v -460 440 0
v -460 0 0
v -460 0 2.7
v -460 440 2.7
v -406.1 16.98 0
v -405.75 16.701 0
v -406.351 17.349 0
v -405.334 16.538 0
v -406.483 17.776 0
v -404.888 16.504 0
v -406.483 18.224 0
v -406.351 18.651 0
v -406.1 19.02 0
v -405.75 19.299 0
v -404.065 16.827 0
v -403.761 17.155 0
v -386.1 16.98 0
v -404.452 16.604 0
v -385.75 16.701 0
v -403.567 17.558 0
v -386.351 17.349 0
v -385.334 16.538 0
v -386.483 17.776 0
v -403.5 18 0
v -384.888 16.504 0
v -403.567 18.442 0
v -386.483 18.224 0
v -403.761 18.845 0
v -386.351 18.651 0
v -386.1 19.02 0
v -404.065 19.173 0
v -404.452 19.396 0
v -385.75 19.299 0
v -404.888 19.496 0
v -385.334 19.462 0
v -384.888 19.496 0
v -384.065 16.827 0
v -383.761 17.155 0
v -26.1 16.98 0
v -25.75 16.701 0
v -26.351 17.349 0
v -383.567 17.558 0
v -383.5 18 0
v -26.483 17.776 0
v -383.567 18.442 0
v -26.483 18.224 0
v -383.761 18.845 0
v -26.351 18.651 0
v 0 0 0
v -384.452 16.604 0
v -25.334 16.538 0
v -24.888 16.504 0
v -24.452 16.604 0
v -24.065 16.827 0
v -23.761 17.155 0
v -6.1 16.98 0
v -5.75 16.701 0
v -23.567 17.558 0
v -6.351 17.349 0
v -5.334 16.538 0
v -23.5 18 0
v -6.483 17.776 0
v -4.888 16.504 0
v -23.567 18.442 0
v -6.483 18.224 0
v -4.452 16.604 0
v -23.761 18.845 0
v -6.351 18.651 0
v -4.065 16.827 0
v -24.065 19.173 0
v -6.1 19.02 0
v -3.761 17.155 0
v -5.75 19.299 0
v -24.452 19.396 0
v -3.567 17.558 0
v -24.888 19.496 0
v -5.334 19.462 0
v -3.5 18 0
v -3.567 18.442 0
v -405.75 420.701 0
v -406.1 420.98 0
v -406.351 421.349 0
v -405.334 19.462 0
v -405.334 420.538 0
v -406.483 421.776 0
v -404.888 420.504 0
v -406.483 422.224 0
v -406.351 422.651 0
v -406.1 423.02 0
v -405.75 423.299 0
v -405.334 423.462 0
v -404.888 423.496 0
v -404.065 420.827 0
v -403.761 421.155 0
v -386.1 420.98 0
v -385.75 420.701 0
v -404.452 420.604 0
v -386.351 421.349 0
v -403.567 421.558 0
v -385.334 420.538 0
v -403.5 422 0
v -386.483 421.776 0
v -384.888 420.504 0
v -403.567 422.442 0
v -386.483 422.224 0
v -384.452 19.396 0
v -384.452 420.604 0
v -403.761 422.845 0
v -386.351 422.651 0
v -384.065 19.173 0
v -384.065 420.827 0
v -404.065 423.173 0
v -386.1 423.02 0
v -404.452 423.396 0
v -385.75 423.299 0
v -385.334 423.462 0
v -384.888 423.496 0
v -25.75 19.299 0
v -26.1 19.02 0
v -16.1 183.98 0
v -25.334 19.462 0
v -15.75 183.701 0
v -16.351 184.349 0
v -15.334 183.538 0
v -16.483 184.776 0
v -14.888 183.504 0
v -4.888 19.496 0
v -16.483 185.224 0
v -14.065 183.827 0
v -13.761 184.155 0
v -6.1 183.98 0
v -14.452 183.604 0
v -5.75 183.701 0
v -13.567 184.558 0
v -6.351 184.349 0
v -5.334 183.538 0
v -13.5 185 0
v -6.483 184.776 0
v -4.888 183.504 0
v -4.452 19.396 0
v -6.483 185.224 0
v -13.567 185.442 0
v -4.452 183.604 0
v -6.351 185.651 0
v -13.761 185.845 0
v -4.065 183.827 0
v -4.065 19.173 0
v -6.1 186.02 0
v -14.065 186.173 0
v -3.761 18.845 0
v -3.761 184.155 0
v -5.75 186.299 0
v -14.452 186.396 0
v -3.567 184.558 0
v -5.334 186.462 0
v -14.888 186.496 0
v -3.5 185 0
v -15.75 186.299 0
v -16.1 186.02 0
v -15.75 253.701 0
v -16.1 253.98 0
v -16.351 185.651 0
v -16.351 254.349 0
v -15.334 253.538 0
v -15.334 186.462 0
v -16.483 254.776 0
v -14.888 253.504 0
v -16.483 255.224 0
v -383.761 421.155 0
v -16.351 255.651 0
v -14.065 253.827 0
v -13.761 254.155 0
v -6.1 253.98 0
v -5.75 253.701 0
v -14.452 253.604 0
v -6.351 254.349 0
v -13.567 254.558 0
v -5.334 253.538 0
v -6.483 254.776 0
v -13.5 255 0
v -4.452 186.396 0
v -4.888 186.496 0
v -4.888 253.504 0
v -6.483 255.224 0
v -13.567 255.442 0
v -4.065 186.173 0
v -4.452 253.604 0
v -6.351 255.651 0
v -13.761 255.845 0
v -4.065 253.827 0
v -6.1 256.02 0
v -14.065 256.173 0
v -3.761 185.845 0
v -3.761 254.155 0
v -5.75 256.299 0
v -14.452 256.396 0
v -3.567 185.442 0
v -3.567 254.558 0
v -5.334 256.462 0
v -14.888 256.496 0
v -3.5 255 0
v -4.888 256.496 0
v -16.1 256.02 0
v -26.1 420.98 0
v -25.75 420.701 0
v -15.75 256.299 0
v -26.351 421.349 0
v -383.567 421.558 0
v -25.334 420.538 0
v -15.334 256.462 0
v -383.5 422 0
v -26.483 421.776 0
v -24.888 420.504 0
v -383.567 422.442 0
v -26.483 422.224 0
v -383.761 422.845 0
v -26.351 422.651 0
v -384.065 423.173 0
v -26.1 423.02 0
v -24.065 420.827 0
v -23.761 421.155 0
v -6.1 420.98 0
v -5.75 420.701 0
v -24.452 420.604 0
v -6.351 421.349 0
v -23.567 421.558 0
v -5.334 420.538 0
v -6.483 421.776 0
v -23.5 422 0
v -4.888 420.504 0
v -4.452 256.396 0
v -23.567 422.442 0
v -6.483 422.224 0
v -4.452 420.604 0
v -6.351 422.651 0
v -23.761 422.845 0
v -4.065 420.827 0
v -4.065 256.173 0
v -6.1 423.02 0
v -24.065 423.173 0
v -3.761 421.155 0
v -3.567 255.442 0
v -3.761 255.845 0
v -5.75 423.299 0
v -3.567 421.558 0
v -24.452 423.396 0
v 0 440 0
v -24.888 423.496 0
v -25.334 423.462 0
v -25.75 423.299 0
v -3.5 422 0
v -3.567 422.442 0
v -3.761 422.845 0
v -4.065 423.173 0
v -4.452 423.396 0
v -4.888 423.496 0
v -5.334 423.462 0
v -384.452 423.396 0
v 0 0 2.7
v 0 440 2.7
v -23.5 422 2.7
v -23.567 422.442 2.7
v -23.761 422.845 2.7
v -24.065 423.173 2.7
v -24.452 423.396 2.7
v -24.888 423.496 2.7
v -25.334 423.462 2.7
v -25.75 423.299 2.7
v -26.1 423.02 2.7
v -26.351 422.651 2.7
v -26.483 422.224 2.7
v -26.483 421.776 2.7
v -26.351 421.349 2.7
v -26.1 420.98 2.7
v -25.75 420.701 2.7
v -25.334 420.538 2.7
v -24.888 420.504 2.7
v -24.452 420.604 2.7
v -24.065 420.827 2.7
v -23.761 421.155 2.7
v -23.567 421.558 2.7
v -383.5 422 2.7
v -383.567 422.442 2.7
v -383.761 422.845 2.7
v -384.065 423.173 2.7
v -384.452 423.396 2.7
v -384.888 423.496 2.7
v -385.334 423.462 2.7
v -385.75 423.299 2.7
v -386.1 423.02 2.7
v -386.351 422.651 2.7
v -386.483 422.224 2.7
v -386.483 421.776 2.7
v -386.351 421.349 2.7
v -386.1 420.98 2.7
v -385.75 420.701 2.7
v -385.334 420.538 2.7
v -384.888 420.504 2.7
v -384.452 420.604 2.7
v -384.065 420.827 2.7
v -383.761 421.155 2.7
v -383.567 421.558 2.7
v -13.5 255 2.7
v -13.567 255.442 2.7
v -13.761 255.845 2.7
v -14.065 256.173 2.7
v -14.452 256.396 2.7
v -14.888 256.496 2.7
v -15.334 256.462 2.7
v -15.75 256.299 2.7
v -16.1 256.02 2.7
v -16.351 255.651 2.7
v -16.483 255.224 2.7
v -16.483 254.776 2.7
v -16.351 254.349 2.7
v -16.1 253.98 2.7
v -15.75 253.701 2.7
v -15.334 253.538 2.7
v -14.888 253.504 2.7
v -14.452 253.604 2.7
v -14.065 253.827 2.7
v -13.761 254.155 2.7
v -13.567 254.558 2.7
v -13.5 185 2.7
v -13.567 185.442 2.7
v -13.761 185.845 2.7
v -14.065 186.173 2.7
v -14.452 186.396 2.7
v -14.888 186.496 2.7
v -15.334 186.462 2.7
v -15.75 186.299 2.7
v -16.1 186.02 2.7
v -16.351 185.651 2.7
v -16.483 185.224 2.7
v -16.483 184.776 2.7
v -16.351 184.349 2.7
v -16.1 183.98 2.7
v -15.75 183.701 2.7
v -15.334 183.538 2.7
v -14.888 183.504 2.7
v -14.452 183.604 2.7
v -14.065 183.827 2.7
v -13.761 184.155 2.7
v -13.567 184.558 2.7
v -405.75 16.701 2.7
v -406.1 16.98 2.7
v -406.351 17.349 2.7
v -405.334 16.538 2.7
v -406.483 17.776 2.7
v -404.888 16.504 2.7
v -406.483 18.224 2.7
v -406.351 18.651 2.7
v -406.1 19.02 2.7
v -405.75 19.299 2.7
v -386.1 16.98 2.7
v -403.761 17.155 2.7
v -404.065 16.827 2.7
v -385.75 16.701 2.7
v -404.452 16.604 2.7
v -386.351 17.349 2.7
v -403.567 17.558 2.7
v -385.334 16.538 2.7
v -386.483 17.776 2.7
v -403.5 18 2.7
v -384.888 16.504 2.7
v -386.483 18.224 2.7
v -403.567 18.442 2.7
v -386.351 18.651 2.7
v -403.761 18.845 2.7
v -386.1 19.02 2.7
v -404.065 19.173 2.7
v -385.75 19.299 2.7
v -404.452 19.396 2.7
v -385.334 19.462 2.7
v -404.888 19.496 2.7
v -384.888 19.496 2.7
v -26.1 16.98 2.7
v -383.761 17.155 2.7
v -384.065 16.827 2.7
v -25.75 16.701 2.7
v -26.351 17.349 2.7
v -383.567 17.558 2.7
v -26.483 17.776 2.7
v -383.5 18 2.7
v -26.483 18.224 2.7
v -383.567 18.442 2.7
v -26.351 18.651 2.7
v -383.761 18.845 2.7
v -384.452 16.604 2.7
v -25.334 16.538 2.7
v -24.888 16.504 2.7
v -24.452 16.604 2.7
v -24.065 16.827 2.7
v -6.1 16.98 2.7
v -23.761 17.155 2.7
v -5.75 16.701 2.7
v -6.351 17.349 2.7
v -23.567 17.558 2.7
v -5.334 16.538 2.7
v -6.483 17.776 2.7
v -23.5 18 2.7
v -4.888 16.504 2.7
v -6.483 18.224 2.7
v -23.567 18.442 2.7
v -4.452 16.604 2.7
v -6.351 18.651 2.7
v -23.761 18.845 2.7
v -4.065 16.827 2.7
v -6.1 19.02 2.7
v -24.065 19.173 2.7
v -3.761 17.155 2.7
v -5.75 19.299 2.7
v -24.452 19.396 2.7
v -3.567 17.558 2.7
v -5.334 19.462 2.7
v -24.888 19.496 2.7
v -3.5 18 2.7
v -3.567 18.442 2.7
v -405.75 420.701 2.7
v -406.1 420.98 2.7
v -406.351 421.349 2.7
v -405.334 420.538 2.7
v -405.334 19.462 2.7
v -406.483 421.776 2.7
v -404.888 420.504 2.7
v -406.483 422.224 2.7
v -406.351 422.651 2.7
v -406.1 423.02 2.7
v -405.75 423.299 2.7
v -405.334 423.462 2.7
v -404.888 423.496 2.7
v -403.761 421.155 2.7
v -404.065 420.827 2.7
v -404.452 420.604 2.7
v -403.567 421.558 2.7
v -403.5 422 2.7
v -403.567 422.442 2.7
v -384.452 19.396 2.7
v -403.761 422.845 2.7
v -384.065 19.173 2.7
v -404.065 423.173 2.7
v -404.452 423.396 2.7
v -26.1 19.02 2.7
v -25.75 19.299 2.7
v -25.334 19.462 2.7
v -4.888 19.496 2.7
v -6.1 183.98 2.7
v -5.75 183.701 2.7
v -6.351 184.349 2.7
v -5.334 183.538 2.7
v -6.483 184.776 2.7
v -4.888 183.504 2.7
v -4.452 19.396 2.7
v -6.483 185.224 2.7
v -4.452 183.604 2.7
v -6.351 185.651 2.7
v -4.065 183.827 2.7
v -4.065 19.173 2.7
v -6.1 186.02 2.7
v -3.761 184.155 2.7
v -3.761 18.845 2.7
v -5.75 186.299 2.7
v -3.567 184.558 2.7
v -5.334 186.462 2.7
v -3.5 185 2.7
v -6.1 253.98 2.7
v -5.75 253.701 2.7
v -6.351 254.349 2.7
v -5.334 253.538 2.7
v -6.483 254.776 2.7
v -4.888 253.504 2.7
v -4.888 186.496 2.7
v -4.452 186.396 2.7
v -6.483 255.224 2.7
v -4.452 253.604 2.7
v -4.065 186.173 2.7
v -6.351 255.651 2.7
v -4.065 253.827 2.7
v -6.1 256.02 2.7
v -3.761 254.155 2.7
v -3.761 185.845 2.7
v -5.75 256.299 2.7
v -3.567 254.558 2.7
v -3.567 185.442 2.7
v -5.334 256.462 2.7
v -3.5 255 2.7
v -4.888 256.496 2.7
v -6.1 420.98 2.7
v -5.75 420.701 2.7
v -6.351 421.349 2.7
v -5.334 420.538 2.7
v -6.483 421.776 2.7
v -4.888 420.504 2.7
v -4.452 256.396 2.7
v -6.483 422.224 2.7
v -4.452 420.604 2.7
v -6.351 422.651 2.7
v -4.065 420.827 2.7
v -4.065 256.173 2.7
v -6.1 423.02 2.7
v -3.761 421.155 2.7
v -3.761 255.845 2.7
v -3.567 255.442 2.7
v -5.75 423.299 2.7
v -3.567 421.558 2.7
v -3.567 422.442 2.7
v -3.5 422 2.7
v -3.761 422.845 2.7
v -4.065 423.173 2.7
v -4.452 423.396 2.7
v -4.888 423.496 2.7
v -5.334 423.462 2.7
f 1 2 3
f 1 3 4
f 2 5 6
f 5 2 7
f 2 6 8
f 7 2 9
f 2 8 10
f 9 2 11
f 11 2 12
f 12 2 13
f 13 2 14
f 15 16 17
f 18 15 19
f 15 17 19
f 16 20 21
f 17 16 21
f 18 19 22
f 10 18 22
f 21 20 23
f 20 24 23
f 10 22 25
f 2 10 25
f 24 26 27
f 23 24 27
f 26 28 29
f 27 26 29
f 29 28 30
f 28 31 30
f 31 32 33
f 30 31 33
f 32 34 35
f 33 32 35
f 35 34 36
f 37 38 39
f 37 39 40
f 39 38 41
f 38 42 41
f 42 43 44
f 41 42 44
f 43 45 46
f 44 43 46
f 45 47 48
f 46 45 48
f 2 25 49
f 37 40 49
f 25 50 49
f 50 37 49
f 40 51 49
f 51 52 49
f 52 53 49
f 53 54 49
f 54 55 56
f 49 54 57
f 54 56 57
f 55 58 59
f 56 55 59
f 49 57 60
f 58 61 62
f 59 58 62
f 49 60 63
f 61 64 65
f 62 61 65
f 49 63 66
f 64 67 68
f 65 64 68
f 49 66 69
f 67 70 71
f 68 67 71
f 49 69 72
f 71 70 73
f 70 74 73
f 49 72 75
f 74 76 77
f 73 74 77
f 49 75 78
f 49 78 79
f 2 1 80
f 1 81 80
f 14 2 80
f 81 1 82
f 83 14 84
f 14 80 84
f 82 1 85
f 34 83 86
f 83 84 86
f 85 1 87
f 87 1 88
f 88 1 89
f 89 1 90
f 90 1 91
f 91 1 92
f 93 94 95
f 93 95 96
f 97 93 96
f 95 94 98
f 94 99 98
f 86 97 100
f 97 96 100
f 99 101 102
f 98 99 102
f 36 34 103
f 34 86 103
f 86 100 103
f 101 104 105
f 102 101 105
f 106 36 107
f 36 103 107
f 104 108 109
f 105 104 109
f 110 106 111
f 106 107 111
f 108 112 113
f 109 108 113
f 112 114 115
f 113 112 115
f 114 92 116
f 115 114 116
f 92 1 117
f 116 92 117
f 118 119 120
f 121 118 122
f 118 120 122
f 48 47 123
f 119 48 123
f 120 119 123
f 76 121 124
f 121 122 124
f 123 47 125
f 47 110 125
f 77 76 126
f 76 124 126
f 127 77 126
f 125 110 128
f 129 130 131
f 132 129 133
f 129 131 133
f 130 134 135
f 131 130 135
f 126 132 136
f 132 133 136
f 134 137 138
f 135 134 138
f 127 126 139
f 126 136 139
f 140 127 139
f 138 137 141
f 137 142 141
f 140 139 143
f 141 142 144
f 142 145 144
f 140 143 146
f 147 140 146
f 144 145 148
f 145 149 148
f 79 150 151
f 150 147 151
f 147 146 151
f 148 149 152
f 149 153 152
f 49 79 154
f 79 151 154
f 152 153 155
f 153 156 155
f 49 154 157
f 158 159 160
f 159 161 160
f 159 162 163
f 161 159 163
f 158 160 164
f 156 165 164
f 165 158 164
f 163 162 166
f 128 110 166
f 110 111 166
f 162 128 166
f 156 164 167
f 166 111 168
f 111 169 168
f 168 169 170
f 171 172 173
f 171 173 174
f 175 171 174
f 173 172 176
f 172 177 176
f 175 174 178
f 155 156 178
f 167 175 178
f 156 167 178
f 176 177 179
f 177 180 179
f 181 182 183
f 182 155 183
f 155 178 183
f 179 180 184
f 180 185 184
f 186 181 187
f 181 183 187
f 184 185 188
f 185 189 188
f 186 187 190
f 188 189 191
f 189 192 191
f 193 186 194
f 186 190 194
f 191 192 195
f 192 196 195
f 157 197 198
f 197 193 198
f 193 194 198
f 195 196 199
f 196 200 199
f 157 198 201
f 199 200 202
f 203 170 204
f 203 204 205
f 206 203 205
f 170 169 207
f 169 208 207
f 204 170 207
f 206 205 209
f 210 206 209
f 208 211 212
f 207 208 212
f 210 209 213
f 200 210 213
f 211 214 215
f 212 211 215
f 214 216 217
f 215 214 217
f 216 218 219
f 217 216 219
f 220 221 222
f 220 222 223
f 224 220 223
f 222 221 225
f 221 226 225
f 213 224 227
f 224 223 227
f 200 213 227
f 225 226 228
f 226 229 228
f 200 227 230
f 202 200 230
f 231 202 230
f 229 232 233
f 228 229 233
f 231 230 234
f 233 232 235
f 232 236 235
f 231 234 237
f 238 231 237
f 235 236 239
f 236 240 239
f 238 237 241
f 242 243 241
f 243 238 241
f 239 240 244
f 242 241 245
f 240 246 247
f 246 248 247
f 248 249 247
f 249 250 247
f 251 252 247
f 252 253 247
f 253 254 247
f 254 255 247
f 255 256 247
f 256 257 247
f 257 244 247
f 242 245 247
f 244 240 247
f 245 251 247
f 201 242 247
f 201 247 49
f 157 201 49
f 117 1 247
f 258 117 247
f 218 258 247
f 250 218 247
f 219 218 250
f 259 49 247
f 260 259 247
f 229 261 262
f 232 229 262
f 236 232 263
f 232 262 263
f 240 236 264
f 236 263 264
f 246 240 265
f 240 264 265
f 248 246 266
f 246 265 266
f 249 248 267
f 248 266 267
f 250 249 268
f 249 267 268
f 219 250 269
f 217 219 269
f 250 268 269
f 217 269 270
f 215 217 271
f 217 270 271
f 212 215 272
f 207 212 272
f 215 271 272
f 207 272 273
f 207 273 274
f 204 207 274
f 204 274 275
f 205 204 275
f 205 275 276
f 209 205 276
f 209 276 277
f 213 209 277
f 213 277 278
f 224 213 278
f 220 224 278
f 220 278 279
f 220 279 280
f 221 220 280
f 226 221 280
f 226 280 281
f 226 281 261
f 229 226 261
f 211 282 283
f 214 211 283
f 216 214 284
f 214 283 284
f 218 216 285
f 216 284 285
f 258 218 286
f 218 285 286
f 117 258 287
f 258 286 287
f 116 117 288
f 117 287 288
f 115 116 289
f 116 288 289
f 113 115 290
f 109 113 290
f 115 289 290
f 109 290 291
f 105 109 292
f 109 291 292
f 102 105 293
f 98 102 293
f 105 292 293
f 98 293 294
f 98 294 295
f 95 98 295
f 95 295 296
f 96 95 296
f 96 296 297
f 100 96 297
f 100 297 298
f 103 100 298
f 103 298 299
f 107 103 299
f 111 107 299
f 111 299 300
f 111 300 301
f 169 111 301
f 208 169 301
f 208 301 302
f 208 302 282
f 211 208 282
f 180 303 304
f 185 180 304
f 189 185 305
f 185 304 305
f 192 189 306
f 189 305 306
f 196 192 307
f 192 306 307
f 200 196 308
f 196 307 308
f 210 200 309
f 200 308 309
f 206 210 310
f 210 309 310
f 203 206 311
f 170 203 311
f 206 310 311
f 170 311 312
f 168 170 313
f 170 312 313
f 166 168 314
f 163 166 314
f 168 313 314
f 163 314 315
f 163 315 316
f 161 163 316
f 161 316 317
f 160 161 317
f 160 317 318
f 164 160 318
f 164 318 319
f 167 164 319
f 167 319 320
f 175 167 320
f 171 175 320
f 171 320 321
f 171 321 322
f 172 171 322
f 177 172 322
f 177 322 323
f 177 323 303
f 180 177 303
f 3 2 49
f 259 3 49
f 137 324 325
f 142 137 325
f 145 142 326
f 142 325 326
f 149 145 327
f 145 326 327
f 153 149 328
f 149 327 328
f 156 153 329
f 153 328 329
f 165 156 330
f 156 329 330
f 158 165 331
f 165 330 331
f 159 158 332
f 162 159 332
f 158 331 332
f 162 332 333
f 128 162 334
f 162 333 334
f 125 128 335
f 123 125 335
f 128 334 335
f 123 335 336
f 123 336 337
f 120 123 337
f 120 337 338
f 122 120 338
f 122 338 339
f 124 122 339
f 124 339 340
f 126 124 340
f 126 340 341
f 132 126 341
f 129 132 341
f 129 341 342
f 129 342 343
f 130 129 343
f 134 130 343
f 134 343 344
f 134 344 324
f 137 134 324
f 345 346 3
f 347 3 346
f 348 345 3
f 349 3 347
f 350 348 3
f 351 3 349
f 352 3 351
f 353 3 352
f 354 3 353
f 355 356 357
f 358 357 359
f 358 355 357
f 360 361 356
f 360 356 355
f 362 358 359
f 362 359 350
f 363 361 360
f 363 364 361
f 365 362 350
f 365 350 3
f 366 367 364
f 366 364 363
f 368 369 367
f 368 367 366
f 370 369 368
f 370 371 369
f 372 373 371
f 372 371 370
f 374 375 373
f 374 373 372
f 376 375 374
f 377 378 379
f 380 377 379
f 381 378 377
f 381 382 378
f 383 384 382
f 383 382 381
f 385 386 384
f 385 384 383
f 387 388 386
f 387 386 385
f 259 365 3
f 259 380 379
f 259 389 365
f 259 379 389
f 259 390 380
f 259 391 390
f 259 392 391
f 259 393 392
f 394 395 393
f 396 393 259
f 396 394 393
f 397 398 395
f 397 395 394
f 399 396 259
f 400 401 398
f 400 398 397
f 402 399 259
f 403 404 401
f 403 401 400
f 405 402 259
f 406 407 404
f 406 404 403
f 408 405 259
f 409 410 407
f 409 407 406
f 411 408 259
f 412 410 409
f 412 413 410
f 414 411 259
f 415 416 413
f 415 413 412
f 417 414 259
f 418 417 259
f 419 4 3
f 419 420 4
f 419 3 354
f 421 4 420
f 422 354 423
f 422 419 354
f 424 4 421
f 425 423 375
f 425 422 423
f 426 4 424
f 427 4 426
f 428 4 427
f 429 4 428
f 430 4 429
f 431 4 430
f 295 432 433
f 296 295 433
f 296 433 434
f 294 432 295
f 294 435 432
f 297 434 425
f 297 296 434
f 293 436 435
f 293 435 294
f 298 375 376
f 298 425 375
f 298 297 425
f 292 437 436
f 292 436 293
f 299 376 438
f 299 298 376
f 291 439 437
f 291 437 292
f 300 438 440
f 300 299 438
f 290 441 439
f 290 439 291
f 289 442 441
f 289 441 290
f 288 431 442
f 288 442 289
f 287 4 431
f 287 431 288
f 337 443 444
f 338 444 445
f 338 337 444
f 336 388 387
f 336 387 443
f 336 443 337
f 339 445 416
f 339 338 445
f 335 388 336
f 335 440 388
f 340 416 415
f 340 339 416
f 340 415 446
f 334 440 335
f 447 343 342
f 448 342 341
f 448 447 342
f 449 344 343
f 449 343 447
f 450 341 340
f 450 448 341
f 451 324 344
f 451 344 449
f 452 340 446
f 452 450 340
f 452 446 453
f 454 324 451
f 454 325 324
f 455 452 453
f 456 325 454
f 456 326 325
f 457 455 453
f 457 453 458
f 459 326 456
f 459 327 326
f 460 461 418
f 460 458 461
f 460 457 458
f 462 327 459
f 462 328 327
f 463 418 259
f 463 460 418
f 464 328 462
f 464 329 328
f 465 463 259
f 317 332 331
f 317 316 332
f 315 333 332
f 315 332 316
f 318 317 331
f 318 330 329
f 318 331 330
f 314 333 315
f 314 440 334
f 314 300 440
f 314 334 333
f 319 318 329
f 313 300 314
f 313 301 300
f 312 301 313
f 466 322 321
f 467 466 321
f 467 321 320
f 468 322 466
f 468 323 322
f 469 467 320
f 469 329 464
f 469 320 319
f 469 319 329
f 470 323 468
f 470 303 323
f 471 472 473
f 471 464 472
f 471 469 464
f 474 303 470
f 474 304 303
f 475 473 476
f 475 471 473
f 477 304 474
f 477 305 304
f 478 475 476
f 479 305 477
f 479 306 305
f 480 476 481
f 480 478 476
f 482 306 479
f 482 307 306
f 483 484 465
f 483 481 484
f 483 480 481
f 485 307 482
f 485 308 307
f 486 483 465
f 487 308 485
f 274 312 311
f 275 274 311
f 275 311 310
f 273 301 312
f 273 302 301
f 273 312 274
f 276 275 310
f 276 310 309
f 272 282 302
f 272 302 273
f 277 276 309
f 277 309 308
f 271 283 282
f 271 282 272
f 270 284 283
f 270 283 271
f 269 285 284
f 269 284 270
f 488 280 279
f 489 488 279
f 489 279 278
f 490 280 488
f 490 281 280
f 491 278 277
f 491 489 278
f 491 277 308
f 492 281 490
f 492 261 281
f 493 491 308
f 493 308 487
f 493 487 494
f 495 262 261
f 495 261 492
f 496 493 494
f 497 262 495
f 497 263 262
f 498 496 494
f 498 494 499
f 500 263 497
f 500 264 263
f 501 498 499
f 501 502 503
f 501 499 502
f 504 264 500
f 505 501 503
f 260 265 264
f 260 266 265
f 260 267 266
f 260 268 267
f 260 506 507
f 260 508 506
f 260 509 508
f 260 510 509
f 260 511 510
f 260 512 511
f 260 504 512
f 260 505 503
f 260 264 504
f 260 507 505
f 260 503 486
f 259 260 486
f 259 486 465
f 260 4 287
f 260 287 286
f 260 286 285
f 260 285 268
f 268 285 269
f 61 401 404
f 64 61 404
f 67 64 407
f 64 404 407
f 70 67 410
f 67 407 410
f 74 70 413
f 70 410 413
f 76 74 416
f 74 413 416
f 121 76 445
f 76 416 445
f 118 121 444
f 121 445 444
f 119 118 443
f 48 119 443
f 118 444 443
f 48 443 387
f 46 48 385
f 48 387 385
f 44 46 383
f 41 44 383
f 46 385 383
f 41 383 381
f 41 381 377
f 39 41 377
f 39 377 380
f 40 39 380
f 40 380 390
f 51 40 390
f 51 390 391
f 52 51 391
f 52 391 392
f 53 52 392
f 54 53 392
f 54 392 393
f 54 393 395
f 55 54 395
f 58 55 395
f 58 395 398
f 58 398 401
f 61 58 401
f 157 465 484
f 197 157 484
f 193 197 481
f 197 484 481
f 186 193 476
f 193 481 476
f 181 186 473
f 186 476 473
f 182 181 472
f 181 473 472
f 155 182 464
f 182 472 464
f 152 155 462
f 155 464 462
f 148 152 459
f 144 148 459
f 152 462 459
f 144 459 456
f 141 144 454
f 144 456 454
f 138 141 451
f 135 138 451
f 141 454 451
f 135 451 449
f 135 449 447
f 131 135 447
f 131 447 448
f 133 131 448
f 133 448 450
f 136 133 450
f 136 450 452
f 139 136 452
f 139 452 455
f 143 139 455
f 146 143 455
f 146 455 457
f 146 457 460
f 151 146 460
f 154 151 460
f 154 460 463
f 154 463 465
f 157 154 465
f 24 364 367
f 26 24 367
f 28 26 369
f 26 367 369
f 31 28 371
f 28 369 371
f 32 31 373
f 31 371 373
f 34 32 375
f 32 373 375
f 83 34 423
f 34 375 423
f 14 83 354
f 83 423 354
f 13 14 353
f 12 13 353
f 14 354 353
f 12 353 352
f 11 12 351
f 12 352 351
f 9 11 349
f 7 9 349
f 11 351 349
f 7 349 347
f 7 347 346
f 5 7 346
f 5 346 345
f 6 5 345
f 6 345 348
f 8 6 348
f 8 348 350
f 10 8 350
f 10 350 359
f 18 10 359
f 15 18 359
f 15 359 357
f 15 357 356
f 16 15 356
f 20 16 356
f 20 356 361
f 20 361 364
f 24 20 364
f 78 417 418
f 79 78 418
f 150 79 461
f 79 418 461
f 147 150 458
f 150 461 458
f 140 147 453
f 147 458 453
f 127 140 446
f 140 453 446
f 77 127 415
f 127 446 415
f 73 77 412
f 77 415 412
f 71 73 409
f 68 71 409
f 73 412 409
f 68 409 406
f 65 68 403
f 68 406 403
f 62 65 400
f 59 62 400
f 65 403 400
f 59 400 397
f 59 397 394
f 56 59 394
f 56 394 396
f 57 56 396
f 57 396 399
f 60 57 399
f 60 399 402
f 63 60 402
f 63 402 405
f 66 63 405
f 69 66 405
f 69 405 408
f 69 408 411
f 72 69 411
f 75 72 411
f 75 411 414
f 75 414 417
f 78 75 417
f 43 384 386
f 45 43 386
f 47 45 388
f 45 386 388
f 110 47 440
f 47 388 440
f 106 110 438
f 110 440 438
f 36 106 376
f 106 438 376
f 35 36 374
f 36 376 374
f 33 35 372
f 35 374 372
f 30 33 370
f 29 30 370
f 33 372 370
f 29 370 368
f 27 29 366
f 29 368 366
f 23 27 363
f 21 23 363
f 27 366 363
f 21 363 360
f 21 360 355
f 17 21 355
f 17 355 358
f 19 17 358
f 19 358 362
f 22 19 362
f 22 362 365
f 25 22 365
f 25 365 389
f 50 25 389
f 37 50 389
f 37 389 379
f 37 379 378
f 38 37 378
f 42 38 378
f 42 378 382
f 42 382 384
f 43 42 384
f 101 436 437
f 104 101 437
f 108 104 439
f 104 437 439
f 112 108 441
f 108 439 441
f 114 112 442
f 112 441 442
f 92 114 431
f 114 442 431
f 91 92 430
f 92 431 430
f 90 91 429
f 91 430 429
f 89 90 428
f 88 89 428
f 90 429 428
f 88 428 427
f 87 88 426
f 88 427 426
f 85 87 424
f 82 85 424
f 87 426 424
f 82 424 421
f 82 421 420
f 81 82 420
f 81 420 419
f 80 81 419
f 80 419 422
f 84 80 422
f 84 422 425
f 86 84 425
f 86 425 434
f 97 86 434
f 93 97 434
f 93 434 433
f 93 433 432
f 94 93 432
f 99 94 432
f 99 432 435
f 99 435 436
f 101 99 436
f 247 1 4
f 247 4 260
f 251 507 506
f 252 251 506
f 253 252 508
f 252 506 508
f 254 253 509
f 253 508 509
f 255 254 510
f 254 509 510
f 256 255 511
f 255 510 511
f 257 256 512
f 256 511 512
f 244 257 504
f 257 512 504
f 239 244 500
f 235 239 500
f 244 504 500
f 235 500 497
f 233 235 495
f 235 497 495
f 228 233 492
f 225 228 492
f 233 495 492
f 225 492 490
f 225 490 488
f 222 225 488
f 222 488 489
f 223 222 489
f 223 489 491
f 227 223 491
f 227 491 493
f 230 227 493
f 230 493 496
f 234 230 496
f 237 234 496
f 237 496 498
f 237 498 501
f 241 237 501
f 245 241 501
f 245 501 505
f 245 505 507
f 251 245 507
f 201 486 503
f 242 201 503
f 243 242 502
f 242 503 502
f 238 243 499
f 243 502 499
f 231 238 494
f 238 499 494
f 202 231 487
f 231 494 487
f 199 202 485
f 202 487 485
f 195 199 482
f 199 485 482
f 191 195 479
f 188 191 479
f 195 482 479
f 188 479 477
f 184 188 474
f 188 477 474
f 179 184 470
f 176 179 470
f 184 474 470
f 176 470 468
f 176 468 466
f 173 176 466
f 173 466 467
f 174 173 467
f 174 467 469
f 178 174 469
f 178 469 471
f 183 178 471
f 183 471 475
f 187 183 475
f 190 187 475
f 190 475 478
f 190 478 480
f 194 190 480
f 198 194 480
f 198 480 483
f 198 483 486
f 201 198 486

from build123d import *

# Parameters (mm, degrees)
SKETCH_1_W          = 460
SKETCH_1_H          = 440
EXTRUDE_1_DEPTH     = 2.7
SKETCH_2_R          = 1.5
CUT_EXTRUDE_1_DEPTH = 10
SKETCH_3_R          = 1.5
CUT_EXTRUDE_2_DEPTH = 10


with BuildPart() as part:
    # 草图1 → 凸台-拉伸1 (new body)
    with BuildSketch(Plane.XY):
        with Locations((-230, 220)):
            Rectangle(SKETCH_1_W, SKETCH_1_H)
    extrude(amount=EXTRUDE_1_DEPTH)

    # 草图2 → 切除-拉伸1 (cut)
    with BuildSketch(Plane.XY.offset(2.7)):
        with Locations((-5, 422)):
            Circle(SKETCH_2_R)
        with Locations((-25, 422)):
            Circle(SKETCH_2_R)
        with Locations((-25, 18)):
            Circle(SKETCH_2_R)
        with Locations((-5, 18)):
            Circle(SKETCH_2_R)
        with Locations((-385, 422)):
            Circle(SKETCH_2_R)
        with Locations((-405, 422)):
            Circle(SKETCH_2_R)
        with Locations((-405, 18)):
            Circle(SKETCH_2_R)
        with Locations((-385, 18)):
            Circle(SKETCH_2_R)
    extrude(amount=-CUT_EXTRUDE_1_DEPTH, mode=Mode.SUBTRACT)

    # 草图3 → 切除-拉伸2 (cut)
    with BuildSketch(Plane.XY.offset(2.7)):
        with Locations((-15, 255)):
            Circle(SKETCH_3_R)
        with Locations((-5, 255)):
            Circle(SKETCH_3_R)
        with Locations((-5, 185)):
            Circle(SKETCH_3_R)
        with Locations((-15, 185)):
            Circle(SKETCH_3_R)
    extrude(amount=-CUT_EXTRUDE_2_DEPTH, mode=Mode.SUBTRACT)


solid = part.part
